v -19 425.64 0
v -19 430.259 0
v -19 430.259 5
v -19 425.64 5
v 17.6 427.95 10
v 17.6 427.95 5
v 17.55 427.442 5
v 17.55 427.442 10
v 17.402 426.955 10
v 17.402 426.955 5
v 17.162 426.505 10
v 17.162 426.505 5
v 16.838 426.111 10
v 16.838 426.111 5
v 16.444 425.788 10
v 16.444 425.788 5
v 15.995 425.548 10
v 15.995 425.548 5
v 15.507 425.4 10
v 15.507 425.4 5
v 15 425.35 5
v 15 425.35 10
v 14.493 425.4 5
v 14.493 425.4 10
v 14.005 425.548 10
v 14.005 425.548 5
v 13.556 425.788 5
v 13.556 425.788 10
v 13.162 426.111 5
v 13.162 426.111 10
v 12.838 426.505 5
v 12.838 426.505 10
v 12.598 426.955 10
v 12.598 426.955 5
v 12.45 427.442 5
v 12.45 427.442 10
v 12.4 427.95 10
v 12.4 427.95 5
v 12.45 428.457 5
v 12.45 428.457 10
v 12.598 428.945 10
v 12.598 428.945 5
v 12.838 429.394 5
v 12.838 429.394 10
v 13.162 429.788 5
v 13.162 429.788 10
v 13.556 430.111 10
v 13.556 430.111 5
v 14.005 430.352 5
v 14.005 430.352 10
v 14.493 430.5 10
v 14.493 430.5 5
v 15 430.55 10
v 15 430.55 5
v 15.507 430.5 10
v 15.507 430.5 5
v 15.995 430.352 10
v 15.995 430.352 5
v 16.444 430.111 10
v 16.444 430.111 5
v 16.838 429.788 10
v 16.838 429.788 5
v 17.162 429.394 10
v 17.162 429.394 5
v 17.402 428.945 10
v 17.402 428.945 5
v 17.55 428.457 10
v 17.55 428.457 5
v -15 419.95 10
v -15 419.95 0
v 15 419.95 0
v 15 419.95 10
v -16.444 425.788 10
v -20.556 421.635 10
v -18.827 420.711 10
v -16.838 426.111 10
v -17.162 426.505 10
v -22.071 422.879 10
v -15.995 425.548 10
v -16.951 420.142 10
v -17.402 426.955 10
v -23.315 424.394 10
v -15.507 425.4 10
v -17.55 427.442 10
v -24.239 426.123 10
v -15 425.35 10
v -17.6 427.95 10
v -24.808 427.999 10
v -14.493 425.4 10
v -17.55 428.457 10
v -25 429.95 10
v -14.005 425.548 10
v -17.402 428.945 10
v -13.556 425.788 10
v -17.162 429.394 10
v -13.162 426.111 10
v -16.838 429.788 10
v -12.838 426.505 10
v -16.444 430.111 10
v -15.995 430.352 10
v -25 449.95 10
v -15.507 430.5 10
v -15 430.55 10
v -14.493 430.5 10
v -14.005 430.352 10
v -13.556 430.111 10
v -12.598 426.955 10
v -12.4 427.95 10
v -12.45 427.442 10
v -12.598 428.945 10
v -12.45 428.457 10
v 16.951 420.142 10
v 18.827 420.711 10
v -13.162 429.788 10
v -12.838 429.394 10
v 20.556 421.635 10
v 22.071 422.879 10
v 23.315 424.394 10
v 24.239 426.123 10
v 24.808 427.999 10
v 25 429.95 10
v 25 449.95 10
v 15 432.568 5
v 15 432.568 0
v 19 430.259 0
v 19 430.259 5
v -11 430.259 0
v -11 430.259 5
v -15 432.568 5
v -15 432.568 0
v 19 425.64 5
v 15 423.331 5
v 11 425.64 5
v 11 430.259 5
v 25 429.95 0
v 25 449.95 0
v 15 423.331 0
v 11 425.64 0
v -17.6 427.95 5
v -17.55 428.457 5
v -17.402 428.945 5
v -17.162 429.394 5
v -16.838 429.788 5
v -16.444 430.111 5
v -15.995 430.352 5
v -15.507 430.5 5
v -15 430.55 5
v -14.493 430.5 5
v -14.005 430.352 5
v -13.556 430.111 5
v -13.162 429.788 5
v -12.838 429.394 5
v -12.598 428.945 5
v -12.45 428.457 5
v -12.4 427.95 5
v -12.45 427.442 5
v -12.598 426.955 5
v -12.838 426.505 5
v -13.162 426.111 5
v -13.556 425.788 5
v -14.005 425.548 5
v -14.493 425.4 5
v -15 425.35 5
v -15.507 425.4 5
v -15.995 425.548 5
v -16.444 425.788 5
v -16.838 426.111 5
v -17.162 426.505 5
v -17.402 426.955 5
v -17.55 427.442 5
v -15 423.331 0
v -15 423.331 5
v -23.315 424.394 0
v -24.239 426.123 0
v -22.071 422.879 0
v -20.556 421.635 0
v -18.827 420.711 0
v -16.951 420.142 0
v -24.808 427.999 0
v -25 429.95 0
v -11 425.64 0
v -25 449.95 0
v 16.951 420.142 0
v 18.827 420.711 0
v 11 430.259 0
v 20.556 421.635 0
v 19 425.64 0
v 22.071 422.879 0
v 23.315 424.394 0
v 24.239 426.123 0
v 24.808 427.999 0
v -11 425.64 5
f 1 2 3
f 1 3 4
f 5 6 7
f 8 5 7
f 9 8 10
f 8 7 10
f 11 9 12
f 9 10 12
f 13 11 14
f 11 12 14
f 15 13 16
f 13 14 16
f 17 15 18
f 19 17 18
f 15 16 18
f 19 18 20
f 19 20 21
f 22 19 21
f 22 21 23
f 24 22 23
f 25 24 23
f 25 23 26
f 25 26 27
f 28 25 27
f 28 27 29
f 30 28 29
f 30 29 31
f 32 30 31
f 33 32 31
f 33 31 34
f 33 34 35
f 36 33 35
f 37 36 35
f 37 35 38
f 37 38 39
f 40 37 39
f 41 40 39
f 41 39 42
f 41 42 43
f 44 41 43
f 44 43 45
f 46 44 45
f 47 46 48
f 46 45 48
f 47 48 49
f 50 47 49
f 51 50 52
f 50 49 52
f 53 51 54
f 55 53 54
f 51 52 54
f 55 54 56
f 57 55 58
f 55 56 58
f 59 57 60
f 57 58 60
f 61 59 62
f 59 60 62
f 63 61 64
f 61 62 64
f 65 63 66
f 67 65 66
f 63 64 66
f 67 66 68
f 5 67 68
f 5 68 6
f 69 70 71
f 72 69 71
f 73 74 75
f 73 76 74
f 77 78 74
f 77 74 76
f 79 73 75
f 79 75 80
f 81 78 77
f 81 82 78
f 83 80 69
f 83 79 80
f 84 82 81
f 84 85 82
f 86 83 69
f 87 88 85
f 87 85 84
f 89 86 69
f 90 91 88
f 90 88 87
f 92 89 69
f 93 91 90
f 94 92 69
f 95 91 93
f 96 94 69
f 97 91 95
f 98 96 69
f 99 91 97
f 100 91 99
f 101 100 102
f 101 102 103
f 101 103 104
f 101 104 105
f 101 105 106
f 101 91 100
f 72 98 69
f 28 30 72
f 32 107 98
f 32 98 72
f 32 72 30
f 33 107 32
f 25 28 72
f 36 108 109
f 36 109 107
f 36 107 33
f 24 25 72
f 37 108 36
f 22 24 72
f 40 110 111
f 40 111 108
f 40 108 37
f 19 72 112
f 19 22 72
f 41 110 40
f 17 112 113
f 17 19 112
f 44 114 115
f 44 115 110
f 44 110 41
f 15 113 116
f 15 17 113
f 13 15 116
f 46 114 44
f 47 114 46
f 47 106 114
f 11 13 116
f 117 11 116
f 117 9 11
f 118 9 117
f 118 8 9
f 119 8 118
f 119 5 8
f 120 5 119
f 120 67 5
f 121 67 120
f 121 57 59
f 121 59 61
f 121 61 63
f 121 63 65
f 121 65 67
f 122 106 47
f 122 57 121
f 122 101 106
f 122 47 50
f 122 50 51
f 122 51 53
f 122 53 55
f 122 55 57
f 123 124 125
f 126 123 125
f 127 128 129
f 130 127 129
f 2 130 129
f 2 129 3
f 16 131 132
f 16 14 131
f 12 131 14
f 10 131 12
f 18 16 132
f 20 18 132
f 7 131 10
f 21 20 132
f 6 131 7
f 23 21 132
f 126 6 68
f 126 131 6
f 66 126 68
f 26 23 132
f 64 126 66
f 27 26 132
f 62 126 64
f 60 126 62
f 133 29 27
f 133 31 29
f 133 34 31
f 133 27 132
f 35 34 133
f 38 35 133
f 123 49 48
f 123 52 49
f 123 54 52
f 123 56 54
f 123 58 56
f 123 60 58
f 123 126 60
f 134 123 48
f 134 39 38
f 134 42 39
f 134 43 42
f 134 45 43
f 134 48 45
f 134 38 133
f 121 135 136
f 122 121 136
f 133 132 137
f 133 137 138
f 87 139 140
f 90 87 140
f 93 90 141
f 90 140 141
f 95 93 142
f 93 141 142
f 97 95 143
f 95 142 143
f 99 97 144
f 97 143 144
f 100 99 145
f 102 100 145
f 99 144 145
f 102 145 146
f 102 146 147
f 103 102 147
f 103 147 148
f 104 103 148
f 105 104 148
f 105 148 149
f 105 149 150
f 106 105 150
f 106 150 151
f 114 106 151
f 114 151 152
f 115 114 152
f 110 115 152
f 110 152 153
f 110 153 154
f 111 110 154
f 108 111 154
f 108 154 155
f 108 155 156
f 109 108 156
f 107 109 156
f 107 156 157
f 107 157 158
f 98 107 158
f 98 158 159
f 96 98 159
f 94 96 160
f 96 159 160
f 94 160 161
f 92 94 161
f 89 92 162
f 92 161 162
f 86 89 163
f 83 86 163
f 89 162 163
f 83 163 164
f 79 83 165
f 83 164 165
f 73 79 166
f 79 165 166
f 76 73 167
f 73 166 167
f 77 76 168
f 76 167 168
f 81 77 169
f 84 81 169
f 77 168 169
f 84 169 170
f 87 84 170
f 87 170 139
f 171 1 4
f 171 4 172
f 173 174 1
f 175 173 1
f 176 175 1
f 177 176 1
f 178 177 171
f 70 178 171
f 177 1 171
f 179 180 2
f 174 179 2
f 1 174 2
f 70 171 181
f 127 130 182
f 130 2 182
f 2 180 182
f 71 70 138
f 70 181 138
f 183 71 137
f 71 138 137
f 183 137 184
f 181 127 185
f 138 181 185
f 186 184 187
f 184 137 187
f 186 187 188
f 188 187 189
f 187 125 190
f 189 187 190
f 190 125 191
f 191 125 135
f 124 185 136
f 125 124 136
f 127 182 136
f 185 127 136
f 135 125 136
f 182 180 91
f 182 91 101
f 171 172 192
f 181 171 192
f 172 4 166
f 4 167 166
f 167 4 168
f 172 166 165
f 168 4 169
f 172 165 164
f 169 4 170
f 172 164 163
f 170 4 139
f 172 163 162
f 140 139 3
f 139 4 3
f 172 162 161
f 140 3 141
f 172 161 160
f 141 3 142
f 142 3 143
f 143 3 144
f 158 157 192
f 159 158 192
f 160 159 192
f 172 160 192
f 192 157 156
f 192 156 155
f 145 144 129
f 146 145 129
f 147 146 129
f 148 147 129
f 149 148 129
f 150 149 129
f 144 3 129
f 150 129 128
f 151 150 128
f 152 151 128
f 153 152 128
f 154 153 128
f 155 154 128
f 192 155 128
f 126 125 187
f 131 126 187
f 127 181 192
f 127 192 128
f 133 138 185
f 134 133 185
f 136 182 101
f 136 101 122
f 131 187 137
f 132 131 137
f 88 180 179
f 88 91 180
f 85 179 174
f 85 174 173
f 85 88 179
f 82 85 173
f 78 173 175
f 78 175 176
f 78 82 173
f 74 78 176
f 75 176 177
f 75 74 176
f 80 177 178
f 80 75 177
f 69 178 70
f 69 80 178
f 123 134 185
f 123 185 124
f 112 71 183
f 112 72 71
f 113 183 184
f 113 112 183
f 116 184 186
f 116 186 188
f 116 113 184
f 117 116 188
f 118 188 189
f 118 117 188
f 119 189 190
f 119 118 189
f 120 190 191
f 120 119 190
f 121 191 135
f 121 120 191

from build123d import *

# Parameters (mm, degrees)
SKETCH1_W           = 50
SKETCH1_H           = 30
BOSS_EXTRUDE1_DEPTH = 10
CUT_EXTRUDE1_DEPTH  = 5
SKETCH3_R           = 2.6
CUT_EXTRUDE2_DEPTH  = 451.671399096
FILLET1_R           = 10


with BuildPart() as part:
    # Sketch1 → Boss-Extrude1 (new body)
    with BuildSketch(Plane.XY):
        with Locations((0, 434.949674923)):
            Rectangle(SKETCH1_W, SKETCH1_H)
    extrude(amount=BOSS_EXTRUDE1_DEPTH)

    # Sketch2 → Cut-Extrude1 (cut)
    with BuildSketch(Plane(origin=(0, 0, 0), x_dir=(-1, 0, 0), z_dir=(0, 0, -1))):
        Polygon((11, 430.259075999), (15, 432.568477076), (19, 430.259075999), (19, 425.640273846), (15, 423.330872769), (11, 425.640273846), align=None)
        Polygon((-15, 432.568477076), (-19, 430.259075999), (-19, 425.640273846), (-15, 423.330872769), (-11, 425.640273846), (-11, 430.259075999), align=None)
    extrude(amount=-CUT_EXTRUDE1_DEPTH, mode=Mode.SUBTRACT)

    # Sketch3 → Cut-Extrude2 (cut, through all)
    with BuildSketch(Plane(origin=(0, 0, 5), x_dir=(-1, 0, 0), z_dir=(0, 0, -1))):
        with Locations((15, 427.949674923)):
            Circle(SKETCH3_R)
        with Locations(Location((-15, 427.949674923, 0), (0, 0, 180))):
            Circle(SKETCH3_R)
    extrude(amount=-CUT_EXTRUDE2_DEPTH, mode=Mode.SUBTRACT)

    # Fillet1
    fillet1_edges = [part.edges().sort_by_distance(p)[0] for p in [
        (25, 419.949674923, 5),
        (-25, 419.949674923, 5),
    ]]
    fillet(fillet1_edges, radius=FILLET1_R)


solid = part.part
